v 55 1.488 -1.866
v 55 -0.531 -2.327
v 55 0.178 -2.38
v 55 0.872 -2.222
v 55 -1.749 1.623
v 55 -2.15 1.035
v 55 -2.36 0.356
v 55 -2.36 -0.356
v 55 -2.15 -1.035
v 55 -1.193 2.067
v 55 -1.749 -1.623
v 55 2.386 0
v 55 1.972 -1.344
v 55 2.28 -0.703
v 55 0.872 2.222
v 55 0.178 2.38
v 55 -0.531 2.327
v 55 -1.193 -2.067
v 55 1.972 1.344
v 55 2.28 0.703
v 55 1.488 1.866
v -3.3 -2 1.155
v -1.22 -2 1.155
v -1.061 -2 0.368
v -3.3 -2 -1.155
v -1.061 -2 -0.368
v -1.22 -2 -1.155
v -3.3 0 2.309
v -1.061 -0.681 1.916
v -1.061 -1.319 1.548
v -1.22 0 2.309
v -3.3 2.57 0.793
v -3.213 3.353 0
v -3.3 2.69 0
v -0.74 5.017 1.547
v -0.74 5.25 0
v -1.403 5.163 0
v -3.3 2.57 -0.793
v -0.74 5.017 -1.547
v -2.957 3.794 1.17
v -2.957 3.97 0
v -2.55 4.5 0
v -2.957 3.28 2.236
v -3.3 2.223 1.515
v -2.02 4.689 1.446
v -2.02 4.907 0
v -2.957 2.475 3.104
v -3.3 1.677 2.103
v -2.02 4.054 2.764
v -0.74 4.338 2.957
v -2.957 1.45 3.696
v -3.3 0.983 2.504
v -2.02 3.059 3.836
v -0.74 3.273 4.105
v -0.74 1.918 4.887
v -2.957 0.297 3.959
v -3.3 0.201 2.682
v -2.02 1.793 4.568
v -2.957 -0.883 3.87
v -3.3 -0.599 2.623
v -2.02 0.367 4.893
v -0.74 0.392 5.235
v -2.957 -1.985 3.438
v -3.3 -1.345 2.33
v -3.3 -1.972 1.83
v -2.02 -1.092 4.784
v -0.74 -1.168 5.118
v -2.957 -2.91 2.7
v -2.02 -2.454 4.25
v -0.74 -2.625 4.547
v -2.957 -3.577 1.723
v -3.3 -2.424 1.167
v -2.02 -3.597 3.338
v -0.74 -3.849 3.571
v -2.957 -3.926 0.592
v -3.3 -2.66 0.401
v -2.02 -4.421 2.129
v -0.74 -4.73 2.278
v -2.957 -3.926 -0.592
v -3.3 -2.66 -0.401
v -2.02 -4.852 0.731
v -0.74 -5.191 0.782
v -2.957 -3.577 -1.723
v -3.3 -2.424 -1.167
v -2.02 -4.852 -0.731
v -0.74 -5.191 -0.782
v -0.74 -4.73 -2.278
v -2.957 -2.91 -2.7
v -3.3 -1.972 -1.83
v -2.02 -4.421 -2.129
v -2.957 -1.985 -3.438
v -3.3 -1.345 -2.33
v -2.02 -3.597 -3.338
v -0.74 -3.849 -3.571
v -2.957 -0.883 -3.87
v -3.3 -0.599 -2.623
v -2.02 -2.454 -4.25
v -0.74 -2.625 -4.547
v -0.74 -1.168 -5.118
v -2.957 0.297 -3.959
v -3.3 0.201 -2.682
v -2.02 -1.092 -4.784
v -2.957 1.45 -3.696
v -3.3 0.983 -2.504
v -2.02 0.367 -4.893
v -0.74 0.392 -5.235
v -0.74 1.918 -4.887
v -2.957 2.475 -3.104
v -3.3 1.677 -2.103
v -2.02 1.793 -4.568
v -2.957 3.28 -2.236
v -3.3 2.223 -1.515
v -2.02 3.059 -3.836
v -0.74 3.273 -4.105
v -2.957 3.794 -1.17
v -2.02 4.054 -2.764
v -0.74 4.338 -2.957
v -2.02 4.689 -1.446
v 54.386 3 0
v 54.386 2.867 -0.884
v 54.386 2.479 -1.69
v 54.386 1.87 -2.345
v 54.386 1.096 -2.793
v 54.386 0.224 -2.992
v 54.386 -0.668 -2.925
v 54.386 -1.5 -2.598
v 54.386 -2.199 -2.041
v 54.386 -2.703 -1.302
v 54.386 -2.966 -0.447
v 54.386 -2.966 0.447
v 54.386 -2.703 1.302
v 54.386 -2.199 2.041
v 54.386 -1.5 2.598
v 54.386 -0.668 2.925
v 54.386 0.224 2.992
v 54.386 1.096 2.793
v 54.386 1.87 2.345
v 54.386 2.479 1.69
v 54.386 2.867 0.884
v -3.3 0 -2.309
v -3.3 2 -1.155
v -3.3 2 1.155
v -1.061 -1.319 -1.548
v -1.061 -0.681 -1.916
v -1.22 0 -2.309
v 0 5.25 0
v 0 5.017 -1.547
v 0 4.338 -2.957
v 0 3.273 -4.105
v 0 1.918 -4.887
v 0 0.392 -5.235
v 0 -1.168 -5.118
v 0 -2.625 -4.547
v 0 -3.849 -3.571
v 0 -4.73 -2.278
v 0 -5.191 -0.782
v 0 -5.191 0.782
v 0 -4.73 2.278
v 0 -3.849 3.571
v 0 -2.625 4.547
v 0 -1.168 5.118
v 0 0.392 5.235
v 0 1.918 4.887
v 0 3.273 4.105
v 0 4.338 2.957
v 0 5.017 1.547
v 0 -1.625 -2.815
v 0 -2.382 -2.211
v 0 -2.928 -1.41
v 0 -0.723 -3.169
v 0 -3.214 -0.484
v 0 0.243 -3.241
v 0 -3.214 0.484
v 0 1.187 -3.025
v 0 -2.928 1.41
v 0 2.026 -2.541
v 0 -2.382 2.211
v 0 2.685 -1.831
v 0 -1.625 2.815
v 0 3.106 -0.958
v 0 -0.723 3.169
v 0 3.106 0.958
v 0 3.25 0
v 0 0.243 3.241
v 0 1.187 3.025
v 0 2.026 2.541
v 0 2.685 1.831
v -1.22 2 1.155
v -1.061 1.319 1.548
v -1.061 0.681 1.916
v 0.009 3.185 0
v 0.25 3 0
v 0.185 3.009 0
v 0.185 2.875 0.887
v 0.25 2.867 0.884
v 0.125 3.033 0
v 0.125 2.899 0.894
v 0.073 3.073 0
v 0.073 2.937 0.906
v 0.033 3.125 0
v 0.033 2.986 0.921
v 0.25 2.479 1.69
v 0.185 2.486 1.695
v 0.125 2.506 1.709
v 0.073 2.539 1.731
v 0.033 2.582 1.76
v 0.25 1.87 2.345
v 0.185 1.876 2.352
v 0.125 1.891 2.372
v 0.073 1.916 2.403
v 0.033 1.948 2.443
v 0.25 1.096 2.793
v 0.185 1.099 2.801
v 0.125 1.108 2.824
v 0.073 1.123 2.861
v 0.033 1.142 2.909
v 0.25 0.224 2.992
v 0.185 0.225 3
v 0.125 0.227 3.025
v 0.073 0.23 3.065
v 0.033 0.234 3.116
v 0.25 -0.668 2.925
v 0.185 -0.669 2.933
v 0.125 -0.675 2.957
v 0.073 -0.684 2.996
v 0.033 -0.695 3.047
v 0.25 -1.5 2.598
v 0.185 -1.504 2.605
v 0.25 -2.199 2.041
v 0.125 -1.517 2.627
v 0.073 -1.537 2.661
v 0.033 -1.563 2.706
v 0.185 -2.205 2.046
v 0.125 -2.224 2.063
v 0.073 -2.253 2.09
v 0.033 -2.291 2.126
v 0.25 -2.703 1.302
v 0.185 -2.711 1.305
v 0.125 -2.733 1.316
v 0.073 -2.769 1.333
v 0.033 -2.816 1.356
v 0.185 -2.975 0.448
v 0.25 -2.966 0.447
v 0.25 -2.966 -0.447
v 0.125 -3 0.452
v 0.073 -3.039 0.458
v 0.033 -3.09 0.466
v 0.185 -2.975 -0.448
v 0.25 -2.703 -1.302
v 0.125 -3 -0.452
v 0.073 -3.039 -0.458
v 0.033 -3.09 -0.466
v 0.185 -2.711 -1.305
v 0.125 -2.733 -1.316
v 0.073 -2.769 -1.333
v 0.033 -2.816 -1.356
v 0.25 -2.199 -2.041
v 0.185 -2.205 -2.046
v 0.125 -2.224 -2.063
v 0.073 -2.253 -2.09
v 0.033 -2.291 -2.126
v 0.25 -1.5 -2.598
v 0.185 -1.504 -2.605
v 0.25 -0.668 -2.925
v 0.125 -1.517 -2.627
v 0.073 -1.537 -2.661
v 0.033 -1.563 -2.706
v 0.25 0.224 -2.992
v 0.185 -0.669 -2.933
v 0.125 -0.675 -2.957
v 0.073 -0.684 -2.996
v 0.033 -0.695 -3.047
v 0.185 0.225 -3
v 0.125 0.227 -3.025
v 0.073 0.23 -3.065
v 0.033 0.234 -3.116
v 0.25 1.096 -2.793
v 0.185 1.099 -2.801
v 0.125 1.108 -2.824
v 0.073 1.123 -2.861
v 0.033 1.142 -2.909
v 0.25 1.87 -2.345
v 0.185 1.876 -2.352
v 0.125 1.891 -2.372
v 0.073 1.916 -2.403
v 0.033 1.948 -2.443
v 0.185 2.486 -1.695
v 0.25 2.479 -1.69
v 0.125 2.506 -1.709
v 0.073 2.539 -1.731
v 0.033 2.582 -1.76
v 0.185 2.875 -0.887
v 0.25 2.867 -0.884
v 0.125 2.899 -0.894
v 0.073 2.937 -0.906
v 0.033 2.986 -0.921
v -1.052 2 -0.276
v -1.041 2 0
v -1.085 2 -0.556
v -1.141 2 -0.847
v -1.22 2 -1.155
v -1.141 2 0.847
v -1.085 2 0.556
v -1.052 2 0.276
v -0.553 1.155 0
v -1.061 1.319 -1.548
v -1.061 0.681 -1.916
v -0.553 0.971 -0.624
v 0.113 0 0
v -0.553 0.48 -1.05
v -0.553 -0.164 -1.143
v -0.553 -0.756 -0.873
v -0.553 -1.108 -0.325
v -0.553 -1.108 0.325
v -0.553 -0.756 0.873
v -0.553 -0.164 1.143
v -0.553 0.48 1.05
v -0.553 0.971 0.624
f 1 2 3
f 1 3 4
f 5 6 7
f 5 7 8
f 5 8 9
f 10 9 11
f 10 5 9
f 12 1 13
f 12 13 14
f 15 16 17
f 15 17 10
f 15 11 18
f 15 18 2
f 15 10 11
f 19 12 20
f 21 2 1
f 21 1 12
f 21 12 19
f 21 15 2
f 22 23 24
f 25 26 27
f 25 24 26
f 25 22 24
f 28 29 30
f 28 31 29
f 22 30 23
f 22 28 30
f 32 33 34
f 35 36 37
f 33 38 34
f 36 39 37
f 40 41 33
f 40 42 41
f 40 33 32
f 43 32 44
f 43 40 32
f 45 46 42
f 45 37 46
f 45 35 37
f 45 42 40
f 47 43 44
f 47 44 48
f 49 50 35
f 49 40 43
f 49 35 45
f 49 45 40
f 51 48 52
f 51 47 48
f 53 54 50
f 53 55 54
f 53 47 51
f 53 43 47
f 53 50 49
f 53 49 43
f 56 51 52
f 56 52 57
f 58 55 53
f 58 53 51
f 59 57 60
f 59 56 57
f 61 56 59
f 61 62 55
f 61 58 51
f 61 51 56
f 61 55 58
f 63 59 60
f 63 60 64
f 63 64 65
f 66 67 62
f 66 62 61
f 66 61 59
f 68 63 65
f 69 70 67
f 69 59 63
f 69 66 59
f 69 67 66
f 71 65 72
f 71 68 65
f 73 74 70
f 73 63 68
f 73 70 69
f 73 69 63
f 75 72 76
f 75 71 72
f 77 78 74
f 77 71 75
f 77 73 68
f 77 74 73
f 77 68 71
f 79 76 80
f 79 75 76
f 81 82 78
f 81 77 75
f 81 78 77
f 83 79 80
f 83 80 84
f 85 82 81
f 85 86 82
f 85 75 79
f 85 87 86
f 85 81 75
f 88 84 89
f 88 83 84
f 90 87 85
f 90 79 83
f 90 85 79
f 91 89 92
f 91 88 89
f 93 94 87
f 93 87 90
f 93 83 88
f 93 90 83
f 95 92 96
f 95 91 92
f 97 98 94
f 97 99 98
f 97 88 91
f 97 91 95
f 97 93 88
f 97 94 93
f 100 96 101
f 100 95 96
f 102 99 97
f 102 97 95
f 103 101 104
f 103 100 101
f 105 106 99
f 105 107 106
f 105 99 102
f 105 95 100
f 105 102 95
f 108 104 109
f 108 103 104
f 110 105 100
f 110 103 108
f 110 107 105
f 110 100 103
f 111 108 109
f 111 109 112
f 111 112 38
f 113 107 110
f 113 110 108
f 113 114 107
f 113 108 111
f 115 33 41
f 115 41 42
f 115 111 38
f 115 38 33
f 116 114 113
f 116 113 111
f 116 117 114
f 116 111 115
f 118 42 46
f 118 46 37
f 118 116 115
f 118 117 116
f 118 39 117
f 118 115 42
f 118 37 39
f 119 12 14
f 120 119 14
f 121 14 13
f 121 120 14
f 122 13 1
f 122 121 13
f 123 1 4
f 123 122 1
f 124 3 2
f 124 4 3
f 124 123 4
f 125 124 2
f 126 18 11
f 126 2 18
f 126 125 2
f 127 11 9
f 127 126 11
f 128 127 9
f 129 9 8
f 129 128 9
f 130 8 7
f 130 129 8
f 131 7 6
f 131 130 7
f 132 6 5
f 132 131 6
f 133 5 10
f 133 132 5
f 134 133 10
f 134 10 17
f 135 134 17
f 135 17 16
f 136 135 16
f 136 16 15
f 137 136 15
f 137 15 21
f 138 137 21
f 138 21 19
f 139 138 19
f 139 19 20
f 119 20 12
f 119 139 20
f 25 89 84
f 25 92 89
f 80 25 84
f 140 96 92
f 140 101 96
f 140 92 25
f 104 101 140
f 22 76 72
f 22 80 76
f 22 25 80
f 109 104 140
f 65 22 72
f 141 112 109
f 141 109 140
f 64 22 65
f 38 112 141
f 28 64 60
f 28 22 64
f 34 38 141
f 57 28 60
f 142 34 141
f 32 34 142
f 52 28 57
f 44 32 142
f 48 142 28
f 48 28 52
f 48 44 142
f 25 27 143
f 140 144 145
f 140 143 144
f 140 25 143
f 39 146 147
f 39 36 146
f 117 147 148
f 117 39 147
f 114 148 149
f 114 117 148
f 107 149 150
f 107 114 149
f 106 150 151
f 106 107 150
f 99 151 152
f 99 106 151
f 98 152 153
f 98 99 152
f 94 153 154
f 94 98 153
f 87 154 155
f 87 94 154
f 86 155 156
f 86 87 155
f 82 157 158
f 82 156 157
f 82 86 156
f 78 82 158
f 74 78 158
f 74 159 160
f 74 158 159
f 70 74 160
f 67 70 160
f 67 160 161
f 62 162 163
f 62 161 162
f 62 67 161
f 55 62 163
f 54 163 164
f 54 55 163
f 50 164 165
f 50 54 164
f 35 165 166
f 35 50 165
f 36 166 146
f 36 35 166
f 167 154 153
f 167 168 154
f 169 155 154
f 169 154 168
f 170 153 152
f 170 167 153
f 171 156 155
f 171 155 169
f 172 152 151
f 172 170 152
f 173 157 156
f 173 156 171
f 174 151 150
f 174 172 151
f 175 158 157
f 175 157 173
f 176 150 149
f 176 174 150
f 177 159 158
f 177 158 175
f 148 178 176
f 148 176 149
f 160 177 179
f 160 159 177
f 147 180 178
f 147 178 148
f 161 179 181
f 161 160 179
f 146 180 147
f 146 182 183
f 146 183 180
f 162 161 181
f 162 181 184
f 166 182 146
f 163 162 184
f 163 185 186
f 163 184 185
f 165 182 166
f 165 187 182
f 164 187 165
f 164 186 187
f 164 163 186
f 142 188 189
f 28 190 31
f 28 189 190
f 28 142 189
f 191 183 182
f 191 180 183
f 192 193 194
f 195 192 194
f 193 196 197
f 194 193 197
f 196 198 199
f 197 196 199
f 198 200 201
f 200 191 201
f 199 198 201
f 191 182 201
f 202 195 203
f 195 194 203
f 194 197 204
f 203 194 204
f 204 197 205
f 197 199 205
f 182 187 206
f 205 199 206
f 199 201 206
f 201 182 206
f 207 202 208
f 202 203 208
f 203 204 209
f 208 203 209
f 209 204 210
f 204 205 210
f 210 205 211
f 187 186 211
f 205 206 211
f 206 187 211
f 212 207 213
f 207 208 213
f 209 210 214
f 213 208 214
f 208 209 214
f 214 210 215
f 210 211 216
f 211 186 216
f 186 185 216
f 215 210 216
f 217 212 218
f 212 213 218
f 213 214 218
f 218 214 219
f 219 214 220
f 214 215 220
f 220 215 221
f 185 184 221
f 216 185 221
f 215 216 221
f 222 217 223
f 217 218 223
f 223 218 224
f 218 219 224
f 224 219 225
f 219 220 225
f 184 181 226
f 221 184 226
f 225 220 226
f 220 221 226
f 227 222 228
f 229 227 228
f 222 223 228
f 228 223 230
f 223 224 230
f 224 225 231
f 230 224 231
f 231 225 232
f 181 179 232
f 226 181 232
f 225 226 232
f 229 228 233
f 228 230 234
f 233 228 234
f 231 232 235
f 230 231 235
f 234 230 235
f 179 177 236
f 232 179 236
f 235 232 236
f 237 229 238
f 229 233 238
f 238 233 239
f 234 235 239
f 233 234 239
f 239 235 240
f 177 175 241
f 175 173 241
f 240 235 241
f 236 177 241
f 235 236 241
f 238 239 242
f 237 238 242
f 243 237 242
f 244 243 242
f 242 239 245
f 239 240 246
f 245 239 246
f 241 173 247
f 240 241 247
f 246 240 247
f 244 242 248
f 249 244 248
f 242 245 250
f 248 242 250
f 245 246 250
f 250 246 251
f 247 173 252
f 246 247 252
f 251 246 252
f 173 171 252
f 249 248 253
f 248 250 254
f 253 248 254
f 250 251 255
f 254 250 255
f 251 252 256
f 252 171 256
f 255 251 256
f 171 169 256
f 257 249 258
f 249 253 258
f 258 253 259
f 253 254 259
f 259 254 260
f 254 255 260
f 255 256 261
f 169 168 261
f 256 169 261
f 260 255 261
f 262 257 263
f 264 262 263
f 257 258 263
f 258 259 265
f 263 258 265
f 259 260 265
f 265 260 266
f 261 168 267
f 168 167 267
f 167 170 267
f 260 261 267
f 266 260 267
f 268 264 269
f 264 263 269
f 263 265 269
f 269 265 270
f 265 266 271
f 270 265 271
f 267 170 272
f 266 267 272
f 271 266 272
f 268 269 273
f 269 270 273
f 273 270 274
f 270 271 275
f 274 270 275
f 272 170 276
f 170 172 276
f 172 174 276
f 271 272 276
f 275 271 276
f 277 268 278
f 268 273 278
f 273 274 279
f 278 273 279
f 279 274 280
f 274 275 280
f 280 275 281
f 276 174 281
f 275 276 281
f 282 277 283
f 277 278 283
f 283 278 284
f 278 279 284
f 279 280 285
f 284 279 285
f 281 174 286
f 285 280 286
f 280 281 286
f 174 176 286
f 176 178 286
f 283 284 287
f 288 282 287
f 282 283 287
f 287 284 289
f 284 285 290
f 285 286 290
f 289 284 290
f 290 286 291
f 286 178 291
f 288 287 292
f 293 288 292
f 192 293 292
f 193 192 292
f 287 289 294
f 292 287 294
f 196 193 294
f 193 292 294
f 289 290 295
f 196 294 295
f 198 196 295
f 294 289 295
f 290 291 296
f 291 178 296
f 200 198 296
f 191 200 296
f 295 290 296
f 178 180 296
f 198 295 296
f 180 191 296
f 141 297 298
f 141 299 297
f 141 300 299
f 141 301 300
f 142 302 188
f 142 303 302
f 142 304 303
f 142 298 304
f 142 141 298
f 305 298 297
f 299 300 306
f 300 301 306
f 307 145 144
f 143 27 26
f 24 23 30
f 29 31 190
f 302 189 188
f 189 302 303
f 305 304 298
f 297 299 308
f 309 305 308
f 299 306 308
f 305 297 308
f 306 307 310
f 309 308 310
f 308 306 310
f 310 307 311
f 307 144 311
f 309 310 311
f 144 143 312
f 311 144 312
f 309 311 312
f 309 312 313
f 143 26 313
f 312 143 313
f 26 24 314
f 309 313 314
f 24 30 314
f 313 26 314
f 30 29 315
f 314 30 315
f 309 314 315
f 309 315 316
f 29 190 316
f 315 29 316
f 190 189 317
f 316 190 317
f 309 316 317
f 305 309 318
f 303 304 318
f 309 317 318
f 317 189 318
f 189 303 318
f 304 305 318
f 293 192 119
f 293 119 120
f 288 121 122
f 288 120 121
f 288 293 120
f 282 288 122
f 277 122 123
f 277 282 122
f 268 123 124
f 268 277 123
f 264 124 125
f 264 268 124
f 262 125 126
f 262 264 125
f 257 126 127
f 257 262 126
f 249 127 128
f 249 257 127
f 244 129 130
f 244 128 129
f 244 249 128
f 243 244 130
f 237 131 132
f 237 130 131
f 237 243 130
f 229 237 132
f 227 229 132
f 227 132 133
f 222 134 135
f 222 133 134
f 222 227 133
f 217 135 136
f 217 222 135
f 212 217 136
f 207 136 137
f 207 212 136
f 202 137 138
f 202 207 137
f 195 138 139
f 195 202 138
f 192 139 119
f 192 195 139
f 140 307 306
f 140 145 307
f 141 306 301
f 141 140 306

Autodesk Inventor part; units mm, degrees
ref_plane "YZ Plane" through (0, 0, 0) normal (1, 0, 0) x (0, 1, 0)
ref_plane "XZ Plane" through (0, 0, 0) normal (0, 1, 0) x (-1, 0, 0)
sketch "Sketch1" plane through (0, 0, 0) normal (0, 0, 1) x (1, 0, 0)
  line L0 (0.1133, 0) -> (55, 0)
  line L1 (55, 0) -> (55, 3)
  line L2 (55, 3) -> (31, 3)
  line L3 (31, 3) -> (30.3864, 3)
  line L4 (30.3864, 3) -> (0, 3)
  line L5 (0, 3) -> (0, 5.25)
  line L6 (0, 5.25) -> (-3.3, 5.25)
  line L7 (-3.3, 5.25) -> (-3.3, 2.3094)
  line L8 (-3.3, 2.3094) -> (-1.22, 2.3094)
  line L9 (-1.22, 2.3094) -> (0.1133, 0)
  line L10 (-14.96, 0) -> (66.66, 0) projected
  line L11 (0, -1.05) -> (0, 6.3) projected
  line L12 (31, 3) -> (0, 3) construction
  dimension "d1" = 24
  dimension "d2" = 0.6136
  dimension "d3" = 3.3
  dimension "d4" = 2.08
  dimension "d5" = 60
  dimension "d6" = 6
  dimension "d7" = 6
  dimension "d8" = 4.6188
  dimension "d9" = 10.5
  dimension "d26" = 55
revolve "Body" add sketch "Sketch1" angle 360 about axis through (0.1133, 0, 0) along (1, 0, 0) contours L9 L11 L4 L3 L2 L1 L0 | L9 L8 L7 L6 L5 L11
sketch "Sketch2" plane through (-3.3, 0, 0) normal (-1, 0, 0) x (0, 0, 1)
  circle A0 centre (0, 0) radius 2.3094 projected
  line L0 (0, -7.35) -> (0, 7.35) projected
  line L1 (-7.35, 0) -> (7.35, 0) projected
  line L2 (2.3094, 0) -> (1.1547, -2)
  line L3 (1.1547, -2) -> (-1.1547, -2)
  line L4 (-1.1547, -2) -> (-2.3094, 0)
  line L5 (-2.3094, 0) -> (-1.1547, 2)
  line L6 (-1.1547, 2) -> (1.1547, 2)
  line L7 (1.1547, 2) -> (2.3094, 0)
extrude "Slot" add sketch "Sketch2" against normal up to next contours L7 A0 | A0 L2 | L6 L0 A0 | A0 L0 L3 | L0 L6 A0 | A0 L3 L0 | L4 A0 | A0 L5
fillet "Fillet1" radius 2.56 1 edges at (-3.3, -5.25, 0)
thread "Thread" size "M6x1" class "6g" standard "ISO Metric profile" length 24
chamfer "Chamfer1" distance 0.6135 distance2 0.6135 1 edges at (55, -3, 0) measured on face at (55, 0.1411, 0.823)
ref_plane "Work Plane1" through (29, 0, 0) normal (0, -1, 0) x (1, 0, 0)
fillet "Fillet2" radius 0.25 1 edges at (0, -3, 0)
equation "\"d1\" = GEL"
equation "\"d3\" = KOH"
equation "\"d4\" = INTI"
equation "\"d6\" = GD"
equation "\"d7\" = BDM"
equation "\"d8\" = 1.1547 * SW"
equation "\"d9\" = KOD"
equation "\"d26\" = NLG"
equation "\"d30\" = R"
equation "\"d17\" = RR"
equation "\"d13\" = GEL"
equation "\"d15\" = -0.5 * SPD + 0.5 * GD"
equation "\"d16\" = GUL"
equation "\"GD\" = NND"
equation "\"NLG\" = 55"
equation "\"GEL\" = 24"
equation "\"KOD\" = 10.5"
equation "\"KOH\" = 3.3"
equation "\"INTI\" = 2.08"
equation "\"GAL\" = 0.61345 * PTC"
equation "\"GUL\" = 0.61345 * PTC"
equation "\"BDM\" = NND"
equation "\"SW\" = 4"
equation "\"RR\" = 2.56"
equation "\"SPD\" = NND - 1.2269 * PTC"
equation "\"R\" = 0.25"
equation "\"TOA\" = 30deg"
equation "\"GD1\" = THREADDIA - 1.2269 * PTC"
equation "\"THREADDIA\" = 6"
equation "\"PTC\" = 1"
equation "\"NND\" = 6"
equation "\"KOH1\" = 0.74"
equation "\"E0\" = 4.583"
properties part number "ISO 7380-1 - M6 x 55" material "Steel"
